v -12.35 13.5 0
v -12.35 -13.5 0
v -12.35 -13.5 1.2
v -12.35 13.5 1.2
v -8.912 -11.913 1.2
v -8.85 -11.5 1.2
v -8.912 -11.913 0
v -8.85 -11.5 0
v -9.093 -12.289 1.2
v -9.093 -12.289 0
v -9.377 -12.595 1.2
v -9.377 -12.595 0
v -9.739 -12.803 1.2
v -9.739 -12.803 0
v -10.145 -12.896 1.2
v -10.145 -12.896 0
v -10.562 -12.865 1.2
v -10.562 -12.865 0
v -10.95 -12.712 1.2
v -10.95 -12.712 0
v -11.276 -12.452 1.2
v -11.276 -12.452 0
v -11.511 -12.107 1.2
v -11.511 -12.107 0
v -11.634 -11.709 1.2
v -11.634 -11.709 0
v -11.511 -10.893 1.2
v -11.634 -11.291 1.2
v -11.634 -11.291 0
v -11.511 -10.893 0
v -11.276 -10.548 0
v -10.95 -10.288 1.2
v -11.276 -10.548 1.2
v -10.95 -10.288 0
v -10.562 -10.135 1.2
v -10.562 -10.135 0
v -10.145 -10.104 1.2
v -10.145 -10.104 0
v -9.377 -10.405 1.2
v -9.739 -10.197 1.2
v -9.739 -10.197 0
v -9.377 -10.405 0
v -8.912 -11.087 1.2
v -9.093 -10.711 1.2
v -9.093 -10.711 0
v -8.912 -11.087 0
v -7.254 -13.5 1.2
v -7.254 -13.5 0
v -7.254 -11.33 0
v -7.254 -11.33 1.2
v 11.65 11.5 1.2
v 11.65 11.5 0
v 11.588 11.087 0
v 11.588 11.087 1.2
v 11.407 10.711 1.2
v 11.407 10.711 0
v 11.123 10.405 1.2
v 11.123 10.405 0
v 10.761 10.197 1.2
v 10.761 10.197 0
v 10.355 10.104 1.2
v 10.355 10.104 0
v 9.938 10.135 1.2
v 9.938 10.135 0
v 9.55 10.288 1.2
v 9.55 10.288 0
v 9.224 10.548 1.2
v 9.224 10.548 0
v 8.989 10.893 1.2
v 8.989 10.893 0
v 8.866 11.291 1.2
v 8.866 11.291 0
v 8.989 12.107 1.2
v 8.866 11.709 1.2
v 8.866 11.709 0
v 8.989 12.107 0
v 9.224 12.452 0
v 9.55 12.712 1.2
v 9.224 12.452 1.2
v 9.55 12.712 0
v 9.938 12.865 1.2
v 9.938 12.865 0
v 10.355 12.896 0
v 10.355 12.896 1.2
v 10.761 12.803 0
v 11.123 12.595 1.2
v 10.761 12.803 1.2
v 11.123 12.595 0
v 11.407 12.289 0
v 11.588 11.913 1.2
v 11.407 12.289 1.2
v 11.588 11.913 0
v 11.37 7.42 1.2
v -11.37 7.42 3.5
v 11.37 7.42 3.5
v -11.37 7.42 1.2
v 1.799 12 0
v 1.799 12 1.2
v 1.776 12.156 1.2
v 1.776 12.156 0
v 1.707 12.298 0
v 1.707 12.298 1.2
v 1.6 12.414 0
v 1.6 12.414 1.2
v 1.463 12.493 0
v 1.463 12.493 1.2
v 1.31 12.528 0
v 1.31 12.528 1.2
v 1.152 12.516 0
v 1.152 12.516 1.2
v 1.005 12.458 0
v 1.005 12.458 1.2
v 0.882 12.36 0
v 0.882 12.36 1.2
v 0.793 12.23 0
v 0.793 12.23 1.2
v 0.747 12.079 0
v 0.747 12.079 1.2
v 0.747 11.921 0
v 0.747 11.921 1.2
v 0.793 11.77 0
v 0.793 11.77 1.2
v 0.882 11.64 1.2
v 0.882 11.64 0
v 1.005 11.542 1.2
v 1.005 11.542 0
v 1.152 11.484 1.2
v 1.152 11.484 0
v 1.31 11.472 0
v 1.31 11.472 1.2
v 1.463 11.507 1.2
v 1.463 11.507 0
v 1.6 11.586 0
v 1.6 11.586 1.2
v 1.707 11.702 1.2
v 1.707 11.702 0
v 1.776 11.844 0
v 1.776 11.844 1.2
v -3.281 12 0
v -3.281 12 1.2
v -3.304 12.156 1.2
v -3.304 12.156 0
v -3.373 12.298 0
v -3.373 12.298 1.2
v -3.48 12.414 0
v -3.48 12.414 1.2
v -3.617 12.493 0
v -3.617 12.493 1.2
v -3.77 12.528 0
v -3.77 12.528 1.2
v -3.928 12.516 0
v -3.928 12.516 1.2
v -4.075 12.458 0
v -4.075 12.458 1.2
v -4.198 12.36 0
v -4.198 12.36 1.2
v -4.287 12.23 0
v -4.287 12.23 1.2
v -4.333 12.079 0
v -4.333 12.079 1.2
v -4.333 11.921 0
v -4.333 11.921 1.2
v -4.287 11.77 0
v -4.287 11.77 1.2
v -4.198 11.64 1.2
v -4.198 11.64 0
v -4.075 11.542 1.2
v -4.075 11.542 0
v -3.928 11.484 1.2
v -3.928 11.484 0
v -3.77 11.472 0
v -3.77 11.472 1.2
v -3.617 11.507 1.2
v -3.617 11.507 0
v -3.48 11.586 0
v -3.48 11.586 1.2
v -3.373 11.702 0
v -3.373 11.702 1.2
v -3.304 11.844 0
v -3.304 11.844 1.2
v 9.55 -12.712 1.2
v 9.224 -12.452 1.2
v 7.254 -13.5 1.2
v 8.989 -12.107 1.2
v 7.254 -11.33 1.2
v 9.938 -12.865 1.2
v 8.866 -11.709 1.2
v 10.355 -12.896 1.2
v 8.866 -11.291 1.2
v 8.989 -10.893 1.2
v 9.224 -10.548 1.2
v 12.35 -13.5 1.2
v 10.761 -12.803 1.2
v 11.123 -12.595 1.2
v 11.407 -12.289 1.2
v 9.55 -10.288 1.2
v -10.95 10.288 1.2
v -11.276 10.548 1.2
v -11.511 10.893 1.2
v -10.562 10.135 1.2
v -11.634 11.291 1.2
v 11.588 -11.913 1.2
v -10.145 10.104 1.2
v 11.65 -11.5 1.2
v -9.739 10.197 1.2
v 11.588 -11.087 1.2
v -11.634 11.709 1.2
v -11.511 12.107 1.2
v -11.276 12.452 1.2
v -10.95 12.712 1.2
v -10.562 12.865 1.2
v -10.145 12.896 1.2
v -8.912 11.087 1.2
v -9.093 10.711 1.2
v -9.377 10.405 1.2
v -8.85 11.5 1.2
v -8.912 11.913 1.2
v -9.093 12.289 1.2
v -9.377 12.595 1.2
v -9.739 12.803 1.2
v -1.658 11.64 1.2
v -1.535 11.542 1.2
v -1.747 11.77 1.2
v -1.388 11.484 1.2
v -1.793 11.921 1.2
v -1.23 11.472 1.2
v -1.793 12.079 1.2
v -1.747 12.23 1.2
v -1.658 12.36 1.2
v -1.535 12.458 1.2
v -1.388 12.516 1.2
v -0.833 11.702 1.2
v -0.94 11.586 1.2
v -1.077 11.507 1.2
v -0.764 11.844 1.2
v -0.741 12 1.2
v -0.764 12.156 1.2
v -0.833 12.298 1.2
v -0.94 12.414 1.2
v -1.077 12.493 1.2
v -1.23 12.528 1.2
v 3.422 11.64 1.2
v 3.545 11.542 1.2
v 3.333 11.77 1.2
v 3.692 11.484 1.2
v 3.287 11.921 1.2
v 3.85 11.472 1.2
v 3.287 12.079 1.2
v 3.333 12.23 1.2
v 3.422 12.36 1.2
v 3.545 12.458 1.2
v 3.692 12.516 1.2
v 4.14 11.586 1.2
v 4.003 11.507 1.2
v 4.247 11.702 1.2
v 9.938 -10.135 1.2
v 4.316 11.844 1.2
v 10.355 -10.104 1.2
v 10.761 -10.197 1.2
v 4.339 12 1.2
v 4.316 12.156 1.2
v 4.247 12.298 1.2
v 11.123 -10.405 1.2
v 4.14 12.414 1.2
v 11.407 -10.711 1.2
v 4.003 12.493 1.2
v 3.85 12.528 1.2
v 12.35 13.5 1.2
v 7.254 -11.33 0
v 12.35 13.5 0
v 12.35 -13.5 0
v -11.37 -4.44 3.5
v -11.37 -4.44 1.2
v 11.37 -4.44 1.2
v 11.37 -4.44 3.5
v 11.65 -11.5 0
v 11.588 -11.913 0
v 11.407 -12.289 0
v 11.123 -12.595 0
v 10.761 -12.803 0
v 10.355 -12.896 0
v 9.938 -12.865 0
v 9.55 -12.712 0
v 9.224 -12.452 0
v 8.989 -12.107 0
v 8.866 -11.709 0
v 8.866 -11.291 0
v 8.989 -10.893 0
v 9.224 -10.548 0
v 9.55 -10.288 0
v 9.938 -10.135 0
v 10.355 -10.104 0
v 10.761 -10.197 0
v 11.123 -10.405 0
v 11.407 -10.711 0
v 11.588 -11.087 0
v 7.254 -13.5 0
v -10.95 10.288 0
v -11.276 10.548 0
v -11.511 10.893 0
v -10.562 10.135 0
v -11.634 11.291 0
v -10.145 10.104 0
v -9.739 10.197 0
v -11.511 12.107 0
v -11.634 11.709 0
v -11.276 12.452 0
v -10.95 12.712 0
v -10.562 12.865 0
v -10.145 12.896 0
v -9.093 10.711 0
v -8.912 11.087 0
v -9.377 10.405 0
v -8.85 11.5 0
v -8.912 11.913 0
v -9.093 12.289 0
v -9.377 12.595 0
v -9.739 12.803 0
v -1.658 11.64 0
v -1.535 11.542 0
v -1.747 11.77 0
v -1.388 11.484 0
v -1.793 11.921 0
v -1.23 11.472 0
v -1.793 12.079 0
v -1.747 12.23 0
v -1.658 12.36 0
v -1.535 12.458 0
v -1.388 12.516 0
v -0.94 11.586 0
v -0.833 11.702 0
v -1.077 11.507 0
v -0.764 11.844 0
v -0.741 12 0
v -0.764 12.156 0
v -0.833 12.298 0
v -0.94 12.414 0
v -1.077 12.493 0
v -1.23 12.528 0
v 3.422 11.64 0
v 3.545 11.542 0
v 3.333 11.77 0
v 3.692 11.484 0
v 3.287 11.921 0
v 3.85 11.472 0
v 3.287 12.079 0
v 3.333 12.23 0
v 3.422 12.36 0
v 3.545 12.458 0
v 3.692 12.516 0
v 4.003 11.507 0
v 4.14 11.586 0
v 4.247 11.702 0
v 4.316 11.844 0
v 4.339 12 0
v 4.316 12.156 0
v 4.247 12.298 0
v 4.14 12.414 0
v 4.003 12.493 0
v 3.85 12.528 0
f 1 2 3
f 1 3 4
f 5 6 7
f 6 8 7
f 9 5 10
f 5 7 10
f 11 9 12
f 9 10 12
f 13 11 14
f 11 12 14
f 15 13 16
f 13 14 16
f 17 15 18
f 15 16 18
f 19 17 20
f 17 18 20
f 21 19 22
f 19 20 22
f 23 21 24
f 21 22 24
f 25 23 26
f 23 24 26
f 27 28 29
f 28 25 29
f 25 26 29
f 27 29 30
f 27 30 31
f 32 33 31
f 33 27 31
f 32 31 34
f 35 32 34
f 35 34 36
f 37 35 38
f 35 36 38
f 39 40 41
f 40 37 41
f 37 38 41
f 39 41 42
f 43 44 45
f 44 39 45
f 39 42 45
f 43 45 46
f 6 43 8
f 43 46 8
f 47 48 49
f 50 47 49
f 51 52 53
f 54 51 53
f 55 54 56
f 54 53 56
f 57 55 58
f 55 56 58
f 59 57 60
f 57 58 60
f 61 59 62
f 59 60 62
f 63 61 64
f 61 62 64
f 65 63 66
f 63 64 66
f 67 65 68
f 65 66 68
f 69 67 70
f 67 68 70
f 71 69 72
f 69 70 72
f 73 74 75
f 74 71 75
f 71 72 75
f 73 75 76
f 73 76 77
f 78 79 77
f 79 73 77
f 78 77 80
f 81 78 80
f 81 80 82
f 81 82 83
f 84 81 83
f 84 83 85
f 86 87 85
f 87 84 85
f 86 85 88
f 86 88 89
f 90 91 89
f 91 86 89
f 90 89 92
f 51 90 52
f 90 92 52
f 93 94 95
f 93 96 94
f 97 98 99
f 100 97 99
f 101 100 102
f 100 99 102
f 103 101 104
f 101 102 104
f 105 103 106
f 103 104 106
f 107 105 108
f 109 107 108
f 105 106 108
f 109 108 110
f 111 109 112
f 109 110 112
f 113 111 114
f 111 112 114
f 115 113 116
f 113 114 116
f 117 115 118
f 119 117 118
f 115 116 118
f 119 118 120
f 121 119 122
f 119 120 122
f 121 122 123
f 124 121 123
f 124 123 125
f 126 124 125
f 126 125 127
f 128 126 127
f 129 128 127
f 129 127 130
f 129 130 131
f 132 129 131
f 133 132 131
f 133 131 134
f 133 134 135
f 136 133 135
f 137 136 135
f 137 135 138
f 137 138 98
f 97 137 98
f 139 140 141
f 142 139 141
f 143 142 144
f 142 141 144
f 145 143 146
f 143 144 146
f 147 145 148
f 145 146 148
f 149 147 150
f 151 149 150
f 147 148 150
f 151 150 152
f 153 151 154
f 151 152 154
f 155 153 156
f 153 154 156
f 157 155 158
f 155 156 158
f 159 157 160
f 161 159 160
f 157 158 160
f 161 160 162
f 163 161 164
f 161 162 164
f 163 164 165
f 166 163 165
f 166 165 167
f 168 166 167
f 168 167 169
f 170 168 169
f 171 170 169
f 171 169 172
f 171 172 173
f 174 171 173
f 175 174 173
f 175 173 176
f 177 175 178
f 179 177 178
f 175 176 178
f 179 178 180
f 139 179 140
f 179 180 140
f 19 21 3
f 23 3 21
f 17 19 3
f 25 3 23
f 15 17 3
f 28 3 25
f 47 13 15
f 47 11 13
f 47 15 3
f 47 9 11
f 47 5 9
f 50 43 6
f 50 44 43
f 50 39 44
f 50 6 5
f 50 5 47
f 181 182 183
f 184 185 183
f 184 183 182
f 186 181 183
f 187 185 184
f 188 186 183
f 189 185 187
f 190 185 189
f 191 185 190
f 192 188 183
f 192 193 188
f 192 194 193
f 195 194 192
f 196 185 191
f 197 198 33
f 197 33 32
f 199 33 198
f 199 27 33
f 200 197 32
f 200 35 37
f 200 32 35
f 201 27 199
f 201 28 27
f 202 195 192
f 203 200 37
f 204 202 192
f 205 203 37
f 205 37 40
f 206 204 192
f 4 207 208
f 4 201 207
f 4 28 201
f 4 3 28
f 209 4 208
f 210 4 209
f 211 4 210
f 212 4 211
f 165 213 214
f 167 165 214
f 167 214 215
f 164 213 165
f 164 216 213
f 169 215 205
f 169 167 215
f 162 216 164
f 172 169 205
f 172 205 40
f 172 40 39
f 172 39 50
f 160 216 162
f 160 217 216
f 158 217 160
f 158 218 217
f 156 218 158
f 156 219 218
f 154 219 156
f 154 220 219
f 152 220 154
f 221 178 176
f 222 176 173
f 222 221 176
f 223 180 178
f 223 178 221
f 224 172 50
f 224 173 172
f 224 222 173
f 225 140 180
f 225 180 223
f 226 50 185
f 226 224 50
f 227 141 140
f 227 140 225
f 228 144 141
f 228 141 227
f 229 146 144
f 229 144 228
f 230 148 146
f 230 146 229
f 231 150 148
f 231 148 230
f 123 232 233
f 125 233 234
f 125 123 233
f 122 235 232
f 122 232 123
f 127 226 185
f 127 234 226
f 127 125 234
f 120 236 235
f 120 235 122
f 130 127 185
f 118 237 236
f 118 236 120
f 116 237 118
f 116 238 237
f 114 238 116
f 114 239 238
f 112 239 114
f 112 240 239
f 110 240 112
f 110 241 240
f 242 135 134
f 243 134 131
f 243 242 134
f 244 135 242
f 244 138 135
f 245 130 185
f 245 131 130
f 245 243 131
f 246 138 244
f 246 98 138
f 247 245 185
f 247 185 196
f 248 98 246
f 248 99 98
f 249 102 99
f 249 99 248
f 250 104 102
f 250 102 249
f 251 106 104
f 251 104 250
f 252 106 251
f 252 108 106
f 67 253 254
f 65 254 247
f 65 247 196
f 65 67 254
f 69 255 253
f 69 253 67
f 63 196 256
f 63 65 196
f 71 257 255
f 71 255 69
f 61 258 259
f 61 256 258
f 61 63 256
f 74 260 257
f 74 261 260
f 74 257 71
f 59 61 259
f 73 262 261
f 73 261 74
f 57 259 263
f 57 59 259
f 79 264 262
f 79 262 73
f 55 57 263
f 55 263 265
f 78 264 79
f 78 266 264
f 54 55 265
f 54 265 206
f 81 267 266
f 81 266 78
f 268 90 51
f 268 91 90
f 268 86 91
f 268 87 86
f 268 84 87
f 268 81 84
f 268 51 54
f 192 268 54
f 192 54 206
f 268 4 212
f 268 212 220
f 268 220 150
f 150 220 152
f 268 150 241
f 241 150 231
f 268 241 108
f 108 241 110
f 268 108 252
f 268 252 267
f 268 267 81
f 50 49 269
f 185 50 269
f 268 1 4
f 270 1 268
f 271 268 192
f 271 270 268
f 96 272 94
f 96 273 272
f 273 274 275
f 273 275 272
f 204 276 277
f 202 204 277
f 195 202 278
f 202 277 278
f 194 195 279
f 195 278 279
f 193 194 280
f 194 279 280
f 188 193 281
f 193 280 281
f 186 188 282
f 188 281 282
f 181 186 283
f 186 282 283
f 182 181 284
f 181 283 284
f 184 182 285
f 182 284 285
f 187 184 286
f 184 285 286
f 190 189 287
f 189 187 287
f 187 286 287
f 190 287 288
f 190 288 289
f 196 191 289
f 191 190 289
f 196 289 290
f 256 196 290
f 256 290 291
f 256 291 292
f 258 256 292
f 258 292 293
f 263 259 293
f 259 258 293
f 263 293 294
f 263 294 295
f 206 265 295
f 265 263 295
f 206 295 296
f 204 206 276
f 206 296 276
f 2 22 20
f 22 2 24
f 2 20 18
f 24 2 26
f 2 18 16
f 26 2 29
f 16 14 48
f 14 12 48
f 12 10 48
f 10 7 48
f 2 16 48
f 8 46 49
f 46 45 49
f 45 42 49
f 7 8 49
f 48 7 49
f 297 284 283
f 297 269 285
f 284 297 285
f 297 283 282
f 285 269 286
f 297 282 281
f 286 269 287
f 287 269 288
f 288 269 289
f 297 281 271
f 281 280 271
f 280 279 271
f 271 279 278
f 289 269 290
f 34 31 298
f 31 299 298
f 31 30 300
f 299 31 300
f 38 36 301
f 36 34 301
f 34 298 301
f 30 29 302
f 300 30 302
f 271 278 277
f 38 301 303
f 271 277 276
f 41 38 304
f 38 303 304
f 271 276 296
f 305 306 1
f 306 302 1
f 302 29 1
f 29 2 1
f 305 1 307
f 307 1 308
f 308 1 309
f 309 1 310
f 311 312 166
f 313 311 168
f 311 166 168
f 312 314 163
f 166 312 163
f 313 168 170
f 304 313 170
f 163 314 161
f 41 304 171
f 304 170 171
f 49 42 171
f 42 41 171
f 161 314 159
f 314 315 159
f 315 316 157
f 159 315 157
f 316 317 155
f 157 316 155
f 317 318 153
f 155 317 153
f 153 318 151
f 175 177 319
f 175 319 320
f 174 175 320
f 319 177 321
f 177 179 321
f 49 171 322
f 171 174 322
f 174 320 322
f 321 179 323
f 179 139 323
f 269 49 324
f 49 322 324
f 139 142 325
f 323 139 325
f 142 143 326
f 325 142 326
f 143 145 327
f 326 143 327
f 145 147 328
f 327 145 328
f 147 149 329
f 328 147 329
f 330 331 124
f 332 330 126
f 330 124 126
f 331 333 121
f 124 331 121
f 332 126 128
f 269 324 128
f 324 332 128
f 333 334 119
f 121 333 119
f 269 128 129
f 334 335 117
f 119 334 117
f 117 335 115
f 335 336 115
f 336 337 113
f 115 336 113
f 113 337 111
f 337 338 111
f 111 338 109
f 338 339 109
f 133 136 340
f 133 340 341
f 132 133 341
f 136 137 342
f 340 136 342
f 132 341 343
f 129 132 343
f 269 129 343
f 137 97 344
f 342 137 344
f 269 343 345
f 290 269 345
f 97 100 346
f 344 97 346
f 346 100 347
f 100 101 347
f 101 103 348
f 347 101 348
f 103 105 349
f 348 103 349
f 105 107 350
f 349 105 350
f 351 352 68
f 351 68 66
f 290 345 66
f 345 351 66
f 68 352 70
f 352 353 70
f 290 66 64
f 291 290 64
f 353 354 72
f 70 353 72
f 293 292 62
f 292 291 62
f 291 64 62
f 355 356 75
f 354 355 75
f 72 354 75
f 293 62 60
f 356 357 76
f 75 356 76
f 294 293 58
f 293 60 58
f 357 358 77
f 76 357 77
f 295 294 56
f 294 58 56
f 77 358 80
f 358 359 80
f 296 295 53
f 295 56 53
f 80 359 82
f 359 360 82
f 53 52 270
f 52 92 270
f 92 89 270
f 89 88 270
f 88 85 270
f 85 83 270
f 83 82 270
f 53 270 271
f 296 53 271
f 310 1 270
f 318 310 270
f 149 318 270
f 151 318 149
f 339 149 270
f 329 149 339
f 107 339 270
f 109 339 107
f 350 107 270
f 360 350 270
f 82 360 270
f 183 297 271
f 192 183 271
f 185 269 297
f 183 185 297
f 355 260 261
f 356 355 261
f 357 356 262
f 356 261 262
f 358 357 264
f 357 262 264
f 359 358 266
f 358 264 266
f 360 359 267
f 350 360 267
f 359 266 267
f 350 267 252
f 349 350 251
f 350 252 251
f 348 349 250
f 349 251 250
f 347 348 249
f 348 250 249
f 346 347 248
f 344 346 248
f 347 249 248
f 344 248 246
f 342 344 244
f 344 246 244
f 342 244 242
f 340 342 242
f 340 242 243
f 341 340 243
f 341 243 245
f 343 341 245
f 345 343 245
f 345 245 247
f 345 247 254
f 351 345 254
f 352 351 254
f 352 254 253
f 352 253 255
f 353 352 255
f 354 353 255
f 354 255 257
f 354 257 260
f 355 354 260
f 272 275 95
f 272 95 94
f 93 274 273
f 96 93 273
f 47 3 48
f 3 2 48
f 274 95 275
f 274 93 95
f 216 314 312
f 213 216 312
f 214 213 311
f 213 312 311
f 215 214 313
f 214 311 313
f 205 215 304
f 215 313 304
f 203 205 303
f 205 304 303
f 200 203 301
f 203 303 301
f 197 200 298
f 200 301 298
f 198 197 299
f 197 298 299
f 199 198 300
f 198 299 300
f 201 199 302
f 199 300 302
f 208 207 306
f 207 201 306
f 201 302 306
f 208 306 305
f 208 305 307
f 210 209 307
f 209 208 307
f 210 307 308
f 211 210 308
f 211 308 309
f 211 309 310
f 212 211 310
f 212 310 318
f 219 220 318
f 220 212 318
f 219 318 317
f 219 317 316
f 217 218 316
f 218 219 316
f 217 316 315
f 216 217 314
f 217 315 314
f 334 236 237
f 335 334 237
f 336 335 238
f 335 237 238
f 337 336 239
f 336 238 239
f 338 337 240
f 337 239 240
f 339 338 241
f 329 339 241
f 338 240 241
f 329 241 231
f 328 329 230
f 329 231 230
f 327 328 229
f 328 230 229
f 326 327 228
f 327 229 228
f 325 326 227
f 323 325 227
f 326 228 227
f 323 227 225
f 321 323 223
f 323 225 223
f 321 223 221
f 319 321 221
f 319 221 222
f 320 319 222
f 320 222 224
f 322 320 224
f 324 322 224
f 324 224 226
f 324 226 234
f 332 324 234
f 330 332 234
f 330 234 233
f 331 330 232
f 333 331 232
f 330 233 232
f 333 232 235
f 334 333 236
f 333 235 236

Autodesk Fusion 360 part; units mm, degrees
sketch "Sketch1" plane through (0, 0, 0) normal (0, 0, 1) x (1, 0, 0)
  line L0 (-12.35, 13.5) -> (12.35, 13.5)
  line L1 (12.35, 13.5) -> (12.35, -13.5)
  line L2 (-12.35, -13.5) -> (-12.35, 13.5)
  line L3 (0, 13.5) -> (0, -13.5)
  line L4 (-12.35, 0) -> (12.35, 0)
  circle A0 centre (-10.25, 11.5) radius 1.4
  circle A1 centre (10.25, 11.5) radius 1.4
  circle A2 centre (-10.25, -11.5) radius 1.4
  circle A3 centre (10.25, -11.5) radius 1.4
  line L5 (-7.2537, -13.5) -> (-7.2537, -11.3301)
  line L6 (-7.2537, -11.3301) -> (7.2537, -11.3301)
  line L7 (7.2537, -11.3301) -> (7.2537, -13.5)
  line L8 (7.2537, -13.5) -> (12.35, -13.5)
  line L9 (-12.35, -13.5) -> (-7.2537, -13.5)
  dimension "d1" = 24.7
  dimension "d2" = 27
  dimension "d11" = 2.8
  dimension "d12" = 2
  dimension "d13" = 2.1
  dimension "d15" = 23
extrude "Extrude2" add sketch "Sketch1" along normal blind 1.2 makes body 1
sketch "Sketch3" plane through (0, 0, 1.2) normal (0, 0, 1) x (-1, 0, 0)
  circle A0 centre (10.25, -11.5) radius 1.4
  circle A1 centre (-10.25, -11.5) radius 1.4
  circle A2 centre (-10.25, 11.5) radius 1.4
  circle A3 centre (10.25, 11.5) radius 1.4
  line L0 (-12.35, 13.5) -> (-12.35, -13.5)
  line L1 (-12.35, -13.5) -> (12.35, -13.5)
  line L2 (12.35, -13.5) -> (12.35, 13.5)
  line L3 (11.37, -7.42) -> (-11.37, -7.42)
  line L4 (-11.37, -7.42) -> (-11.37, 4.44)
  line L5 (-11.37, 4.44) -> (11.37, 4.44)
  line L6 (11.37, 4.44) -> (11.37, -7.42)
  line L7 (0, -13.5) -> (0, 13.5)
  line L8 (12.35, -13.5) -> (-12.35, -13.5)
  line L9 (12.35, 13.5) -> (7.2537, 13.5)
  line L10 (7.2537, 13.5) -> (7.2537, 11.3301)
  line L11 (7.2537, 11.3301) -> (-7.2537, 11.3301)
  line L12 (-7.2537, 11.3301) -> (-7.2537, 13.5)
  line L13 (-7.2537, 13.5) -> (-12.35, 13.5)
  dimension "d18" = 22.74
  dimension "d19" = 11.86
  dimension "d20" = 6.08
extrude "Extrude3" add sketch "Sketch3" along normal blind 2.3 separate body contours L3 L5 L6 L7 | L3 L4 L5 L7 makes body 2
sketch "Sketch4" plane through (0, 0, 1.2) normal (0, 0, 1) x (-1, 0, 0)
  circle A0 centre (10.25, -11.5) radius 1.4
  circle A1 centre (-10.25, -11.5) radius 1.4
  circle A2 centre (10.25, 11.5) radius 1.4
  circle A3 centre (-10.25, 11.5) radius 1.4
  line L0 (12.35, -13.5) -> (12.35, 13.5)
  line L1 (12.35, 13.5) -> (7.2537, 13.5)
  line L2 (7.2537, 13.5) -> (7.2537, 11.3301)
  line L3 (7.2537, 11.3301) -> (-7.2537, 11.3301)
  line L4 (-7.2537, 11.3301) -> (-7.2537, 13.5)
  line L5 (-7.2537, 13.5) -> (-12.35, 13.5)
  line L6 (-12.35, 13.5) -> (-12.35, -13.5)
  line L7 (-12.35, -13.5) -> (12.35, -13.5)
  line L8 (8.3994, -12) -> (-8.3994, -12) construction
  line L9 (12.35, -13.5) -> (-12.35, -13.5) construction
  line L10 (0, -13.5) -> (0, 13.5) construction
  dimension "d23" = 1.5
sketch "Sketch5" plane through (0, 0, 1.2) normal (0, 0, 1) x (1, 0, 0)
  circle A0 centre (-3.81, 12) radius 0.5291
  circle A1 centre (-1.27, 12) radius 0.5291
  circle A2 centre (1.27, 12) radius 0.5291
  circle A3 centre (3.81, 12) radius 0.5291
  line L0 (0, 13.5) -> (0, -13.5)
  line L1 (-8.3994, 12) -> (8.3994, 12)
  dimension "d29" = 2.54
  dimension "d30" = 2.54
extrude "Extrude4" cut sketch "Sketch5" against normal up to surface (1.2 mm away) bodies 1
sketch "Sketch2" plane through (0, 0, 1.2) normal (0, 0, 1) x (-1, 0, 0)
  line L0 (13, 14) -> (-11.7, 14)
  line L1 (-11.7, 14) -> (-11.7, -13)
  line L2 (-11.7, -13) -> (13, -13)
  line L3 (13, -13) -> (13, 14)
